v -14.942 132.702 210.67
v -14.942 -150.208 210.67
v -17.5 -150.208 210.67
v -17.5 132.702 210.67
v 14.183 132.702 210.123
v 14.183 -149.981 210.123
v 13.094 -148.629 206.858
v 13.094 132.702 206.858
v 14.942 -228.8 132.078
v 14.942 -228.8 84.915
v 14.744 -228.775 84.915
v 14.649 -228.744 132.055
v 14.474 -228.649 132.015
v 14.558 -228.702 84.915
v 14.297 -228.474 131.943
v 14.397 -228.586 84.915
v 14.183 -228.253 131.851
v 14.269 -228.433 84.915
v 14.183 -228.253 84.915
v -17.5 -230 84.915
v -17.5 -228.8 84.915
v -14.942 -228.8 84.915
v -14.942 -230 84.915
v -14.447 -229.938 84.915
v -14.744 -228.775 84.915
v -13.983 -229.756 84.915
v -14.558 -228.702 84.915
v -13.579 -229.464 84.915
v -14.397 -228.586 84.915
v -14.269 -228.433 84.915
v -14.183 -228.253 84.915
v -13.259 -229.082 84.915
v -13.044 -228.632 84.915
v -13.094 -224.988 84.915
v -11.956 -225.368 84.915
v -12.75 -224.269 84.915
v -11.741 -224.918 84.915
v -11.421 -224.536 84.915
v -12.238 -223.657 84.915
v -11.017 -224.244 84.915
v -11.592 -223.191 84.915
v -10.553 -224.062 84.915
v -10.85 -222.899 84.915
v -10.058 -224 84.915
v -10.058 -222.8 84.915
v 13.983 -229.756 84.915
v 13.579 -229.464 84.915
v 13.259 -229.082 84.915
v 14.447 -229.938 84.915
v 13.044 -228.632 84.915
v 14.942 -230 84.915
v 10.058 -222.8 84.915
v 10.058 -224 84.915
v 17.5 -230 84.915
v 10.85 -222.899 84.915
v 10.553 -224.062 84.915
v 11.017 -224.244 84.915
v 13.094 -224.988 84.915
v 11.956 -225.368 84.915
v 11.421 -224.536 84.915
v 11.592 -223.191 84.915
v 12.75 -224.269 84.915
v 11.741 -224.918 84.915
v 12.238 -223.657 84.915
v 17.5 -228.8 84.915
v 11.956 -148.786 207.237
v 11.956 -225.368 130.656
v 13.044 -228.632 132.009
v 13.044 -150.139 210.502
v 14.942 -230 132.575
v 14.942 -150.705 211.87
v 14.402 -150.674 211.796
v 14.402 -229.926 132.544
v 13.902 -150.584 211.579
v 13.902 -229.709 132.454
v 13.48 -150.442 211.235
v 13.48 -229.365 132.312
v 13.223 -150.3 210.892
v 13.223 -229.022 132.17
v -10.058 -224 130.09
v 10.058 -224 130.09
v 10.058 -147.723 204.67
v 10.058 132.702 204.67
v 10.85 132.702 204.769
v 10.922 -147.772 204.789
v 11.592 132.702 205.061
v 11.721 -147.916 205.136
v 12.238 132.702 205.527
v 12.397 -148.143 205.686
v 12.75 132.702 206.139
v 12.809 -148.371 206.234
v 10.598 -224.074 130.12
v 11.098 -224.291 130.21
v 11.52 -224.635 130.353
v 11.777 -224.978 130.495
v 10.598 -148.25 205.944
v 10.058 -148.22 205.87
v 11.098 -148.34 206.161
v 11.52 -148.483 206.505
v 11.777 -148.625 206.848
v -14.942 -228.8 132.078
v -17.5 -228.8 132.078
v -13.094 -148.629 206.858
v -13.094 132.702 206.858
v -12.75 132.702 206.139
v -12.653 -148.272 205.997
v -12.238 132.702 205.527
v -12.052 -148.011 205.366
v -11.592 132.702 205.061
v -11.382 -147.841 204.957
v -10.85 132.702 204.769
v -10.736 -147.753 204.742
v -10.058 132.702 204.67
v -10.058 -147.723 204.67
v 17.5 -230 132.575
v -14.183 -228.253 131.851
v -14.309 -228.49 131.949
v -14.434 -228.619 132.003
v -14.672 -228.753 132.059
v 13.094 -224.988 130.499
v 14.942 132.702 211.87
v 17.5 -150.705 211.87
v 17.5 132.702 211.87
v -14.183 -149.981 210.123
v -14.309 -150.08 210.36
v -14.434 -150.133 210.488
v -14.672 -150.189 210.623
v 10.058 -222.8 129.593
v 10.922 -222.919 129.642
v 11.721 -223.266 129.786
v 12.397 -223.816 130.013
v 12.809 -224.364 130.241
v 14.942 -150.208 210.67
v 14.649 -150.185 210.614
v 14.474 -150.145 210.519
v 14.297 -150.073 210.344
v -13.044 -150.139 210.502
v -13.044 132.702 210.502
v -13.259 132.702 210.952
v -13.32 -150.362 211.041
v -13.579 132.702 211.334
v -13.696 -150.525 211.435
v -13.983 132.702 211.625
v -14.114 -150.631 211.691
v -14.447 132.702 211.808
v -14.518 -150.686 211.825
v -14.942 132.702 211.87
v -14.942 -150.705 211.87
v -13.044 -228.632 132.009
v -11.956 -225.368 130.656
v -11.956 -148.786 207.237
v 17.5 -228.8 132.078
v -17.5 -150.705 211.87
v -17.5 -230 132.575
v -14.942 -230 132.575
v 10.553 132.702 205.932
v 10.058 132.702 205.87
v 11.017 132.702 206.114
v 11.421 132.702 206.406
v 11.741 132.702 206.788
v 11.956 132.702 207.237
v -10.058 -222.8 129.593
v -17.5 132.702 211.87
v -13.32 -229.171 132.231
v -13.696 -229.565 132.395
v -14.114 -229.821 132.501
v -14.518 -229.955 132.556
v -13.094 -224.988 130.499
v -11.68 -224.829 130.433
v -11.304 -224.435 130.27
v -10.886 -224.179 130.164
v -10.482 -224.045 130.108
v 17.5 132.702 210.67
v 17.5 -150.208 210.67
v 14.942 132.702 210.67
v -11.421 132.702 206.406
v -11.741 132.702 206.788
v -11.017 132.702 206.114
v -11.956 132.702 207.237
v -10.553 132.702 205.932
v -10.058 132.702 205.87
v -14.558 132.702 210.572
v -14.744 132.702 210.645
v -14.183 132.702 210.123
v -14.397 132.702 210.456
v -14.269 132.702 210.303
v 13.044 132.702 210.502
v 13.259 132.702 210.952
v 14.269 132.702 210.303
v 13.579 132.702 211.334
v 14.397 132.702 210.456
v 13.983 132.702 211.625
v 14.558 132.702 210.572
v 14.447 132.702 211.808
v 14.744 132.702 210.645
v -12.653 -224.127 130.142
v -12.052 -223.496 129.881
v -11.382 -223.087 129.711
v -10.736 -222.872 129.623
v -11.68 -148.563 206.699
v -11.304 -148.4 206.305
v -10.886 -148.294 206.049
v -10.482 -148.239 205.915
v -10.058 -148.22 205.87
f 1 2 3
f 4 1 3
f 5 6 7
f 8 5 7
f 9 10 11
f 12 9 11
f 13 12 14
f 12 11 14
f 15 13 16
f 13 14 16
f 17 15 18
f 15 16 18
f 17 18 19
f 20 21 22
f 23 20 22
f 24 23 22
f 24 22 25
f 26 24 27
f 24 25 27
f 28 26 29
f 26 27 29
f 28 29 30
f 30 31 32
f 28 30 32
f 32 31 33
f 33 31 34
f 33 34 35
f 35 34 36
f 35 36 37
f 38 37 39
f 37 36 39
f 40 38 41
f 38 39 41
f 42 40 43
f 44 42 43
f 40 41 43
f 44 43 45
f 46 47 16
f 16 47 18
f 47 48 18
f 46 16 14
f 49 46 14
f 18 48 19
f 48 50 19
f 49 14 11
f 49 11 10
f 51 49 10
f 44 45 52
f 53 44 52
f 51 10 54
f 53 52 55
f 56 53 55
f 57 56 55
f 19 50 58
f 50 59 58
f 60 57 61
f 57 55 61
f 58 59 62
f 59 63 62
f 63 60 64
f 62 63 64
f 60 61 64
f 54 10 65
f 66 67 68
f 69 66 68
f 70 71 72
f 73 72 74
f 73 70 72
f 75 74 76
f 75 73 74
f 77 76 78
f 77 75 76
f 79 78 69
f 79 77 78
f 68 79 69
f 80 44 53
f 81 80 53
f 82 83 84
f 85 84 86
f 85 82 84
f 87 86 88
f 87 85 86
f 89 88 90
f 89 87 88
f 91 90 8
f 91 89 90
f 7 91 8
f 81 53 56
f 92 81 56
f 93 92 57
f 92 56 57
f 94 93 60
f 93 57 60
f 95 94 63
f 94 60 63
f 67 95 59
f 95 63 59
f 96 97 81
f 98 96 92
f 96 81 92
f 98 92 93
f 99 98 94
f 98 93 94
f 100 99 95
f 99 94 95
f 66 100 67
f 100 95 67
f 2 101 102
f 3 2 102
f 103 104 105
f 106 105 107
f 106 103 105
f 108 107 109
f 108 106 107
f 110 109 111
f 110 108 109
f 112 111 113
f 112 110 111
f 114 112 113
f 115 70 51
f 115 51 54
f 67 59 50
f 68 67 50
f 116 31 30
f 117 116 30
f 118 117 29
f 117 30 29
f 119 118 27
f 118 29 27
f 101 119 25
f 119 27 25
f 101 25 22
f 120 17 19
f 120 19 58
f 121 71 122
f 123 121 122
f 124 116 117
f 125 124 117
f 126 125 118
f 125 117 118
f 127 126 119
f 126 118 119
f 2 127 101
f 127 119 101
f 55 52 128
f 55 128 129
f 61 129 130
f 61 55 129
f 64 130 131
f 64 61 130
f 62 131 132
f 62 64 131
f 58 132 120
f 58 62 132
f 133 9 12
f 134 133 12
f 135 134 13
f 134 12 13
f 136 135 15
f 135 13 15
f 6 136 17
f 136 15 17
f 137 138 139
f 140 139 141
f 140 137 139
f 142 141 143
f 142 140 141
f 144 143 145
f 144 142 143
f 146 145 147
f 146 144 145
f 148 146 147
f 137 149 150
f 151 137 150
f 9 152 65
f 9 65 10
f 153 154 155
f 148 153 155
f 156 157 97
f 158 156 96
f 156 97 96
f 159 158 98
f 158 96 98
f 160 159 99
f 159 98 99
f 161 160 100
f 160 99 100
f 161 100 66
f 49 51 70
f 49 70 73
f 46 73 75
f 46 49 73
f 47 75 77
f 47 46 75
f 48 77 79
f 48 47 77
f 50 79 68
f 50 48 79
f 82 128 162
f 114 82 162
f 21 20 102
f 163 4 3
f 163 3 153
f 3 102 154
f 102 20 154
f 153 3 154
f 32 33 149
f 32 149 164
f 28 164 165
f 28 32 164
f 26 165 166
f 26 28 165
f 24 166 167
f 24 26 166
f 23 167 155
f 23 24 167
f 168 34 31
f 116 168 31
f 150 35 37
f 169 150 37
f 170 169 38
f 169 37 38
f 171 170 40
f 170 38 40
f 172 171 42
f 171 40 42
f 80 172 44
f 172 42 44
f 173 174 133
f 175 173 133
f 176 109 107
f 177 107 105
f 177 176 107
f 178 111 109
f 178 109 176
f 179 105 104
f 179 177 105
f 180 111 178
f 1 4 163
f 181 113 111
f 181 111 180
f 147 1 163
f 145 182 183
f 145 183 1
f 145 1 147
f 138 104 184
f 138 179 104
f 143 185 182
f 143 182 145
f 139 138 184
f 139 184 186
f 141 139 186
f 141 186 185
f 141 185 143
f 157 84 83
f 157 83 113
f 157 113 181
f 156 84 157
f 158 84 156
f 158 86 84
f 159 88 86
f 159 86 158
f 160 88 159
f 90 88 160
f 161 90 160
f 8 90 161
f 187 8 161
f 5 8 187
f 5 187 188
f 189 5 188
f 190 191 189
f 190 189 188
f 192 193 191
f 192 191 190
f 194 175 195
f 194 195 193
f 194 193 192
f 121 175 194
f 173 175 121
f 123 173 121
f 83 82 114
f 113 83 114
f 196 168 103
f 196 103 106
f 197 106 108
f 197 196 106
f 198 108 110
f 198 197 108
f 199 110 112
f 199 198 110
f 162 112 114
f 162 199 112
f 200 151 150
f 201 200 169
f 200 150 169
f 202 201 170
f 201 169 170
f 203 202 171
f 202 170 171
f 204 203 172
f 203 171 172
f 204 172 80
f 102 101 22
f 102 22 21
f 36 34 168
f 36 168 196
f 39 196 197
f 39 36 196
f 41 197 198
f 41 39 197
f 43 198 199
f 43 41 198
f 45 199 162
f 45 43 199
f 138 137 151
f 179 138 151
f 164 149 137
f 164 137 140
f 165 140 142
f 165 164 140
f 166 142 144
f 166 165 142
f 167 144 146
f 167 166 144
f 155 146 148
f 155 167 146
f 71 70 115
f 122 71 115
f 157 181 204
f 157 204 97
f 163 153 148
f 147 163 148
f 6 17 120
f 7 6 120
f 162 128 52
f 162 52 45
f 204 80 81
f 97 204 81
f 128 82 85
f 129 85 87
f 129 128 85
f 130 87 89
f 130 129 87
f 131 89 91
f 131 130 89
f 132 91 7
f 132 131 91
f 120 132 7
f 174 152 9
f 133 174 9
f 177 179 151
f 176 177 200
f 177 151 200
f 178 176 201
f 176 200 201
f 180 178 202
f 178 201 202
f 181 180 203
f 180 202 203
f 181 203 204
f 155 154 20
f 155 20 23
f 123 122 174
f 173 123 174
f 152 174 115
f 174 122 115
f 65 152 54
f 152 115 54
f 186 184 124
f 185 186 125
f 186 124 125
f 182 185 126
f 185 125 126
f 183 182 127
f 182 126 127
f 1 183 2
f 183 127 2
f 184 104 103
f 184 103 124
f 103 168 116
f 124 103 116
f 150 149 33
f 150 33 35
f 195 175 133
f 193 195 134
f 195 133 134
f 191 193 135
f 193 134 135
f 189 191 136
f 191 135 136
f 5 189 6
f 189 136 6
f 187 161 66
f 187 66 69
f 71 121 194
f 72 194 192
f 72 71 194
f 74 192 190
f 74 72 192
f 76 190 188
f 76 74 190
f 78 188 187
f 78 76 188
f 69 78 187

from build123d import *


with BuildPart() as part:
    # 扫描1: sweep along a path in 草图1
    with BuildLine(Plane(origin=(0, 0, 0), x_dir=(0, 0, -1), z_dir=(1, 0, 0))) as sweep_1_path:
        Line((-211.869954442, 132.702101833), (-211.869954442, -150.705045558))
        Line((-211.869954442, -150.705045558), (-132.575, -230))
        Line((-132.575, -230), (-84.915, -230))
    # 草图2 → 扫描1 (sweep)
    with BuildSketch(Plane(origin=(0, 132.702101833, 211.869954442), x_dir=(1, 0, 0), z_dir=(0, 1, 0))):
        with BuildLine():
            Line((17.5, 0), (14.94151844, 0))
            ThreePointArc((14.94151844, 0), (13.772097871, 0.37751563), (13.044151844, 1.367544468))
            Line((13.044151844, 1.367544468), (11.955848156, 4.632455532))
            ThreePointArc((11.955848156, 4.632455532), (11.227902129, 5.62248437), (10.05848156, 6))
            Line((10.05848156, 6), (-10.05848156, 6))
            ThreePointArc((-10.05848156, 6), (-11.227902129, 5.62248437), (-11.955848156, 4.632455532))
            Line((-11.955848156, 4.632455532), (-13.044151844, 1.367544468))
            ThreePointArc((-13.044151844, 1.367544468), (-13.772097871, 0.37751563), (-14.94151844, 0))
            Line((-14.94151844, 0), (-17.5, 0))
            Line((-17.5, 0), (-17.5, 1.2))
            Line((-17.5, 1.2), (-14.94151844, 1.2))
            ThreePointArc((-14.94151844, 1.2), (-14.473750212, 1.351006252), (-14.182571802, 1.747017787))
            Line((-14.182571802, 1.747017787), (-13.094268114, 5.011928851))
            ThreePointArc((-13.094268114, 5.011928851), (-11.929554471, 6.595974993), (-10.05848156, 7.2))
            Line((-10.05848156, 7.2), (10.05848156, 7.2))
            ThreePointArc((10.05848156, 7.2), (11.929554471, 6.595974993), (13.094268114, 5.011928851))
            Line((13.094268114, 5.011928851), (14.182571802, 1.747017787))
            ThreePointArc((14.182571802, 1.747017787), (14.473750212, 1.351006252), (14.94151844, 1.2))
            Line((14.94151844, 1.2), (17.5, 1.2))
            Line((17.5, 1.2), (17.5, 0))
        make_face()
    sweep(path=sweep_1_path.line, transition=Transition.RIGHT)


solid = part.part
